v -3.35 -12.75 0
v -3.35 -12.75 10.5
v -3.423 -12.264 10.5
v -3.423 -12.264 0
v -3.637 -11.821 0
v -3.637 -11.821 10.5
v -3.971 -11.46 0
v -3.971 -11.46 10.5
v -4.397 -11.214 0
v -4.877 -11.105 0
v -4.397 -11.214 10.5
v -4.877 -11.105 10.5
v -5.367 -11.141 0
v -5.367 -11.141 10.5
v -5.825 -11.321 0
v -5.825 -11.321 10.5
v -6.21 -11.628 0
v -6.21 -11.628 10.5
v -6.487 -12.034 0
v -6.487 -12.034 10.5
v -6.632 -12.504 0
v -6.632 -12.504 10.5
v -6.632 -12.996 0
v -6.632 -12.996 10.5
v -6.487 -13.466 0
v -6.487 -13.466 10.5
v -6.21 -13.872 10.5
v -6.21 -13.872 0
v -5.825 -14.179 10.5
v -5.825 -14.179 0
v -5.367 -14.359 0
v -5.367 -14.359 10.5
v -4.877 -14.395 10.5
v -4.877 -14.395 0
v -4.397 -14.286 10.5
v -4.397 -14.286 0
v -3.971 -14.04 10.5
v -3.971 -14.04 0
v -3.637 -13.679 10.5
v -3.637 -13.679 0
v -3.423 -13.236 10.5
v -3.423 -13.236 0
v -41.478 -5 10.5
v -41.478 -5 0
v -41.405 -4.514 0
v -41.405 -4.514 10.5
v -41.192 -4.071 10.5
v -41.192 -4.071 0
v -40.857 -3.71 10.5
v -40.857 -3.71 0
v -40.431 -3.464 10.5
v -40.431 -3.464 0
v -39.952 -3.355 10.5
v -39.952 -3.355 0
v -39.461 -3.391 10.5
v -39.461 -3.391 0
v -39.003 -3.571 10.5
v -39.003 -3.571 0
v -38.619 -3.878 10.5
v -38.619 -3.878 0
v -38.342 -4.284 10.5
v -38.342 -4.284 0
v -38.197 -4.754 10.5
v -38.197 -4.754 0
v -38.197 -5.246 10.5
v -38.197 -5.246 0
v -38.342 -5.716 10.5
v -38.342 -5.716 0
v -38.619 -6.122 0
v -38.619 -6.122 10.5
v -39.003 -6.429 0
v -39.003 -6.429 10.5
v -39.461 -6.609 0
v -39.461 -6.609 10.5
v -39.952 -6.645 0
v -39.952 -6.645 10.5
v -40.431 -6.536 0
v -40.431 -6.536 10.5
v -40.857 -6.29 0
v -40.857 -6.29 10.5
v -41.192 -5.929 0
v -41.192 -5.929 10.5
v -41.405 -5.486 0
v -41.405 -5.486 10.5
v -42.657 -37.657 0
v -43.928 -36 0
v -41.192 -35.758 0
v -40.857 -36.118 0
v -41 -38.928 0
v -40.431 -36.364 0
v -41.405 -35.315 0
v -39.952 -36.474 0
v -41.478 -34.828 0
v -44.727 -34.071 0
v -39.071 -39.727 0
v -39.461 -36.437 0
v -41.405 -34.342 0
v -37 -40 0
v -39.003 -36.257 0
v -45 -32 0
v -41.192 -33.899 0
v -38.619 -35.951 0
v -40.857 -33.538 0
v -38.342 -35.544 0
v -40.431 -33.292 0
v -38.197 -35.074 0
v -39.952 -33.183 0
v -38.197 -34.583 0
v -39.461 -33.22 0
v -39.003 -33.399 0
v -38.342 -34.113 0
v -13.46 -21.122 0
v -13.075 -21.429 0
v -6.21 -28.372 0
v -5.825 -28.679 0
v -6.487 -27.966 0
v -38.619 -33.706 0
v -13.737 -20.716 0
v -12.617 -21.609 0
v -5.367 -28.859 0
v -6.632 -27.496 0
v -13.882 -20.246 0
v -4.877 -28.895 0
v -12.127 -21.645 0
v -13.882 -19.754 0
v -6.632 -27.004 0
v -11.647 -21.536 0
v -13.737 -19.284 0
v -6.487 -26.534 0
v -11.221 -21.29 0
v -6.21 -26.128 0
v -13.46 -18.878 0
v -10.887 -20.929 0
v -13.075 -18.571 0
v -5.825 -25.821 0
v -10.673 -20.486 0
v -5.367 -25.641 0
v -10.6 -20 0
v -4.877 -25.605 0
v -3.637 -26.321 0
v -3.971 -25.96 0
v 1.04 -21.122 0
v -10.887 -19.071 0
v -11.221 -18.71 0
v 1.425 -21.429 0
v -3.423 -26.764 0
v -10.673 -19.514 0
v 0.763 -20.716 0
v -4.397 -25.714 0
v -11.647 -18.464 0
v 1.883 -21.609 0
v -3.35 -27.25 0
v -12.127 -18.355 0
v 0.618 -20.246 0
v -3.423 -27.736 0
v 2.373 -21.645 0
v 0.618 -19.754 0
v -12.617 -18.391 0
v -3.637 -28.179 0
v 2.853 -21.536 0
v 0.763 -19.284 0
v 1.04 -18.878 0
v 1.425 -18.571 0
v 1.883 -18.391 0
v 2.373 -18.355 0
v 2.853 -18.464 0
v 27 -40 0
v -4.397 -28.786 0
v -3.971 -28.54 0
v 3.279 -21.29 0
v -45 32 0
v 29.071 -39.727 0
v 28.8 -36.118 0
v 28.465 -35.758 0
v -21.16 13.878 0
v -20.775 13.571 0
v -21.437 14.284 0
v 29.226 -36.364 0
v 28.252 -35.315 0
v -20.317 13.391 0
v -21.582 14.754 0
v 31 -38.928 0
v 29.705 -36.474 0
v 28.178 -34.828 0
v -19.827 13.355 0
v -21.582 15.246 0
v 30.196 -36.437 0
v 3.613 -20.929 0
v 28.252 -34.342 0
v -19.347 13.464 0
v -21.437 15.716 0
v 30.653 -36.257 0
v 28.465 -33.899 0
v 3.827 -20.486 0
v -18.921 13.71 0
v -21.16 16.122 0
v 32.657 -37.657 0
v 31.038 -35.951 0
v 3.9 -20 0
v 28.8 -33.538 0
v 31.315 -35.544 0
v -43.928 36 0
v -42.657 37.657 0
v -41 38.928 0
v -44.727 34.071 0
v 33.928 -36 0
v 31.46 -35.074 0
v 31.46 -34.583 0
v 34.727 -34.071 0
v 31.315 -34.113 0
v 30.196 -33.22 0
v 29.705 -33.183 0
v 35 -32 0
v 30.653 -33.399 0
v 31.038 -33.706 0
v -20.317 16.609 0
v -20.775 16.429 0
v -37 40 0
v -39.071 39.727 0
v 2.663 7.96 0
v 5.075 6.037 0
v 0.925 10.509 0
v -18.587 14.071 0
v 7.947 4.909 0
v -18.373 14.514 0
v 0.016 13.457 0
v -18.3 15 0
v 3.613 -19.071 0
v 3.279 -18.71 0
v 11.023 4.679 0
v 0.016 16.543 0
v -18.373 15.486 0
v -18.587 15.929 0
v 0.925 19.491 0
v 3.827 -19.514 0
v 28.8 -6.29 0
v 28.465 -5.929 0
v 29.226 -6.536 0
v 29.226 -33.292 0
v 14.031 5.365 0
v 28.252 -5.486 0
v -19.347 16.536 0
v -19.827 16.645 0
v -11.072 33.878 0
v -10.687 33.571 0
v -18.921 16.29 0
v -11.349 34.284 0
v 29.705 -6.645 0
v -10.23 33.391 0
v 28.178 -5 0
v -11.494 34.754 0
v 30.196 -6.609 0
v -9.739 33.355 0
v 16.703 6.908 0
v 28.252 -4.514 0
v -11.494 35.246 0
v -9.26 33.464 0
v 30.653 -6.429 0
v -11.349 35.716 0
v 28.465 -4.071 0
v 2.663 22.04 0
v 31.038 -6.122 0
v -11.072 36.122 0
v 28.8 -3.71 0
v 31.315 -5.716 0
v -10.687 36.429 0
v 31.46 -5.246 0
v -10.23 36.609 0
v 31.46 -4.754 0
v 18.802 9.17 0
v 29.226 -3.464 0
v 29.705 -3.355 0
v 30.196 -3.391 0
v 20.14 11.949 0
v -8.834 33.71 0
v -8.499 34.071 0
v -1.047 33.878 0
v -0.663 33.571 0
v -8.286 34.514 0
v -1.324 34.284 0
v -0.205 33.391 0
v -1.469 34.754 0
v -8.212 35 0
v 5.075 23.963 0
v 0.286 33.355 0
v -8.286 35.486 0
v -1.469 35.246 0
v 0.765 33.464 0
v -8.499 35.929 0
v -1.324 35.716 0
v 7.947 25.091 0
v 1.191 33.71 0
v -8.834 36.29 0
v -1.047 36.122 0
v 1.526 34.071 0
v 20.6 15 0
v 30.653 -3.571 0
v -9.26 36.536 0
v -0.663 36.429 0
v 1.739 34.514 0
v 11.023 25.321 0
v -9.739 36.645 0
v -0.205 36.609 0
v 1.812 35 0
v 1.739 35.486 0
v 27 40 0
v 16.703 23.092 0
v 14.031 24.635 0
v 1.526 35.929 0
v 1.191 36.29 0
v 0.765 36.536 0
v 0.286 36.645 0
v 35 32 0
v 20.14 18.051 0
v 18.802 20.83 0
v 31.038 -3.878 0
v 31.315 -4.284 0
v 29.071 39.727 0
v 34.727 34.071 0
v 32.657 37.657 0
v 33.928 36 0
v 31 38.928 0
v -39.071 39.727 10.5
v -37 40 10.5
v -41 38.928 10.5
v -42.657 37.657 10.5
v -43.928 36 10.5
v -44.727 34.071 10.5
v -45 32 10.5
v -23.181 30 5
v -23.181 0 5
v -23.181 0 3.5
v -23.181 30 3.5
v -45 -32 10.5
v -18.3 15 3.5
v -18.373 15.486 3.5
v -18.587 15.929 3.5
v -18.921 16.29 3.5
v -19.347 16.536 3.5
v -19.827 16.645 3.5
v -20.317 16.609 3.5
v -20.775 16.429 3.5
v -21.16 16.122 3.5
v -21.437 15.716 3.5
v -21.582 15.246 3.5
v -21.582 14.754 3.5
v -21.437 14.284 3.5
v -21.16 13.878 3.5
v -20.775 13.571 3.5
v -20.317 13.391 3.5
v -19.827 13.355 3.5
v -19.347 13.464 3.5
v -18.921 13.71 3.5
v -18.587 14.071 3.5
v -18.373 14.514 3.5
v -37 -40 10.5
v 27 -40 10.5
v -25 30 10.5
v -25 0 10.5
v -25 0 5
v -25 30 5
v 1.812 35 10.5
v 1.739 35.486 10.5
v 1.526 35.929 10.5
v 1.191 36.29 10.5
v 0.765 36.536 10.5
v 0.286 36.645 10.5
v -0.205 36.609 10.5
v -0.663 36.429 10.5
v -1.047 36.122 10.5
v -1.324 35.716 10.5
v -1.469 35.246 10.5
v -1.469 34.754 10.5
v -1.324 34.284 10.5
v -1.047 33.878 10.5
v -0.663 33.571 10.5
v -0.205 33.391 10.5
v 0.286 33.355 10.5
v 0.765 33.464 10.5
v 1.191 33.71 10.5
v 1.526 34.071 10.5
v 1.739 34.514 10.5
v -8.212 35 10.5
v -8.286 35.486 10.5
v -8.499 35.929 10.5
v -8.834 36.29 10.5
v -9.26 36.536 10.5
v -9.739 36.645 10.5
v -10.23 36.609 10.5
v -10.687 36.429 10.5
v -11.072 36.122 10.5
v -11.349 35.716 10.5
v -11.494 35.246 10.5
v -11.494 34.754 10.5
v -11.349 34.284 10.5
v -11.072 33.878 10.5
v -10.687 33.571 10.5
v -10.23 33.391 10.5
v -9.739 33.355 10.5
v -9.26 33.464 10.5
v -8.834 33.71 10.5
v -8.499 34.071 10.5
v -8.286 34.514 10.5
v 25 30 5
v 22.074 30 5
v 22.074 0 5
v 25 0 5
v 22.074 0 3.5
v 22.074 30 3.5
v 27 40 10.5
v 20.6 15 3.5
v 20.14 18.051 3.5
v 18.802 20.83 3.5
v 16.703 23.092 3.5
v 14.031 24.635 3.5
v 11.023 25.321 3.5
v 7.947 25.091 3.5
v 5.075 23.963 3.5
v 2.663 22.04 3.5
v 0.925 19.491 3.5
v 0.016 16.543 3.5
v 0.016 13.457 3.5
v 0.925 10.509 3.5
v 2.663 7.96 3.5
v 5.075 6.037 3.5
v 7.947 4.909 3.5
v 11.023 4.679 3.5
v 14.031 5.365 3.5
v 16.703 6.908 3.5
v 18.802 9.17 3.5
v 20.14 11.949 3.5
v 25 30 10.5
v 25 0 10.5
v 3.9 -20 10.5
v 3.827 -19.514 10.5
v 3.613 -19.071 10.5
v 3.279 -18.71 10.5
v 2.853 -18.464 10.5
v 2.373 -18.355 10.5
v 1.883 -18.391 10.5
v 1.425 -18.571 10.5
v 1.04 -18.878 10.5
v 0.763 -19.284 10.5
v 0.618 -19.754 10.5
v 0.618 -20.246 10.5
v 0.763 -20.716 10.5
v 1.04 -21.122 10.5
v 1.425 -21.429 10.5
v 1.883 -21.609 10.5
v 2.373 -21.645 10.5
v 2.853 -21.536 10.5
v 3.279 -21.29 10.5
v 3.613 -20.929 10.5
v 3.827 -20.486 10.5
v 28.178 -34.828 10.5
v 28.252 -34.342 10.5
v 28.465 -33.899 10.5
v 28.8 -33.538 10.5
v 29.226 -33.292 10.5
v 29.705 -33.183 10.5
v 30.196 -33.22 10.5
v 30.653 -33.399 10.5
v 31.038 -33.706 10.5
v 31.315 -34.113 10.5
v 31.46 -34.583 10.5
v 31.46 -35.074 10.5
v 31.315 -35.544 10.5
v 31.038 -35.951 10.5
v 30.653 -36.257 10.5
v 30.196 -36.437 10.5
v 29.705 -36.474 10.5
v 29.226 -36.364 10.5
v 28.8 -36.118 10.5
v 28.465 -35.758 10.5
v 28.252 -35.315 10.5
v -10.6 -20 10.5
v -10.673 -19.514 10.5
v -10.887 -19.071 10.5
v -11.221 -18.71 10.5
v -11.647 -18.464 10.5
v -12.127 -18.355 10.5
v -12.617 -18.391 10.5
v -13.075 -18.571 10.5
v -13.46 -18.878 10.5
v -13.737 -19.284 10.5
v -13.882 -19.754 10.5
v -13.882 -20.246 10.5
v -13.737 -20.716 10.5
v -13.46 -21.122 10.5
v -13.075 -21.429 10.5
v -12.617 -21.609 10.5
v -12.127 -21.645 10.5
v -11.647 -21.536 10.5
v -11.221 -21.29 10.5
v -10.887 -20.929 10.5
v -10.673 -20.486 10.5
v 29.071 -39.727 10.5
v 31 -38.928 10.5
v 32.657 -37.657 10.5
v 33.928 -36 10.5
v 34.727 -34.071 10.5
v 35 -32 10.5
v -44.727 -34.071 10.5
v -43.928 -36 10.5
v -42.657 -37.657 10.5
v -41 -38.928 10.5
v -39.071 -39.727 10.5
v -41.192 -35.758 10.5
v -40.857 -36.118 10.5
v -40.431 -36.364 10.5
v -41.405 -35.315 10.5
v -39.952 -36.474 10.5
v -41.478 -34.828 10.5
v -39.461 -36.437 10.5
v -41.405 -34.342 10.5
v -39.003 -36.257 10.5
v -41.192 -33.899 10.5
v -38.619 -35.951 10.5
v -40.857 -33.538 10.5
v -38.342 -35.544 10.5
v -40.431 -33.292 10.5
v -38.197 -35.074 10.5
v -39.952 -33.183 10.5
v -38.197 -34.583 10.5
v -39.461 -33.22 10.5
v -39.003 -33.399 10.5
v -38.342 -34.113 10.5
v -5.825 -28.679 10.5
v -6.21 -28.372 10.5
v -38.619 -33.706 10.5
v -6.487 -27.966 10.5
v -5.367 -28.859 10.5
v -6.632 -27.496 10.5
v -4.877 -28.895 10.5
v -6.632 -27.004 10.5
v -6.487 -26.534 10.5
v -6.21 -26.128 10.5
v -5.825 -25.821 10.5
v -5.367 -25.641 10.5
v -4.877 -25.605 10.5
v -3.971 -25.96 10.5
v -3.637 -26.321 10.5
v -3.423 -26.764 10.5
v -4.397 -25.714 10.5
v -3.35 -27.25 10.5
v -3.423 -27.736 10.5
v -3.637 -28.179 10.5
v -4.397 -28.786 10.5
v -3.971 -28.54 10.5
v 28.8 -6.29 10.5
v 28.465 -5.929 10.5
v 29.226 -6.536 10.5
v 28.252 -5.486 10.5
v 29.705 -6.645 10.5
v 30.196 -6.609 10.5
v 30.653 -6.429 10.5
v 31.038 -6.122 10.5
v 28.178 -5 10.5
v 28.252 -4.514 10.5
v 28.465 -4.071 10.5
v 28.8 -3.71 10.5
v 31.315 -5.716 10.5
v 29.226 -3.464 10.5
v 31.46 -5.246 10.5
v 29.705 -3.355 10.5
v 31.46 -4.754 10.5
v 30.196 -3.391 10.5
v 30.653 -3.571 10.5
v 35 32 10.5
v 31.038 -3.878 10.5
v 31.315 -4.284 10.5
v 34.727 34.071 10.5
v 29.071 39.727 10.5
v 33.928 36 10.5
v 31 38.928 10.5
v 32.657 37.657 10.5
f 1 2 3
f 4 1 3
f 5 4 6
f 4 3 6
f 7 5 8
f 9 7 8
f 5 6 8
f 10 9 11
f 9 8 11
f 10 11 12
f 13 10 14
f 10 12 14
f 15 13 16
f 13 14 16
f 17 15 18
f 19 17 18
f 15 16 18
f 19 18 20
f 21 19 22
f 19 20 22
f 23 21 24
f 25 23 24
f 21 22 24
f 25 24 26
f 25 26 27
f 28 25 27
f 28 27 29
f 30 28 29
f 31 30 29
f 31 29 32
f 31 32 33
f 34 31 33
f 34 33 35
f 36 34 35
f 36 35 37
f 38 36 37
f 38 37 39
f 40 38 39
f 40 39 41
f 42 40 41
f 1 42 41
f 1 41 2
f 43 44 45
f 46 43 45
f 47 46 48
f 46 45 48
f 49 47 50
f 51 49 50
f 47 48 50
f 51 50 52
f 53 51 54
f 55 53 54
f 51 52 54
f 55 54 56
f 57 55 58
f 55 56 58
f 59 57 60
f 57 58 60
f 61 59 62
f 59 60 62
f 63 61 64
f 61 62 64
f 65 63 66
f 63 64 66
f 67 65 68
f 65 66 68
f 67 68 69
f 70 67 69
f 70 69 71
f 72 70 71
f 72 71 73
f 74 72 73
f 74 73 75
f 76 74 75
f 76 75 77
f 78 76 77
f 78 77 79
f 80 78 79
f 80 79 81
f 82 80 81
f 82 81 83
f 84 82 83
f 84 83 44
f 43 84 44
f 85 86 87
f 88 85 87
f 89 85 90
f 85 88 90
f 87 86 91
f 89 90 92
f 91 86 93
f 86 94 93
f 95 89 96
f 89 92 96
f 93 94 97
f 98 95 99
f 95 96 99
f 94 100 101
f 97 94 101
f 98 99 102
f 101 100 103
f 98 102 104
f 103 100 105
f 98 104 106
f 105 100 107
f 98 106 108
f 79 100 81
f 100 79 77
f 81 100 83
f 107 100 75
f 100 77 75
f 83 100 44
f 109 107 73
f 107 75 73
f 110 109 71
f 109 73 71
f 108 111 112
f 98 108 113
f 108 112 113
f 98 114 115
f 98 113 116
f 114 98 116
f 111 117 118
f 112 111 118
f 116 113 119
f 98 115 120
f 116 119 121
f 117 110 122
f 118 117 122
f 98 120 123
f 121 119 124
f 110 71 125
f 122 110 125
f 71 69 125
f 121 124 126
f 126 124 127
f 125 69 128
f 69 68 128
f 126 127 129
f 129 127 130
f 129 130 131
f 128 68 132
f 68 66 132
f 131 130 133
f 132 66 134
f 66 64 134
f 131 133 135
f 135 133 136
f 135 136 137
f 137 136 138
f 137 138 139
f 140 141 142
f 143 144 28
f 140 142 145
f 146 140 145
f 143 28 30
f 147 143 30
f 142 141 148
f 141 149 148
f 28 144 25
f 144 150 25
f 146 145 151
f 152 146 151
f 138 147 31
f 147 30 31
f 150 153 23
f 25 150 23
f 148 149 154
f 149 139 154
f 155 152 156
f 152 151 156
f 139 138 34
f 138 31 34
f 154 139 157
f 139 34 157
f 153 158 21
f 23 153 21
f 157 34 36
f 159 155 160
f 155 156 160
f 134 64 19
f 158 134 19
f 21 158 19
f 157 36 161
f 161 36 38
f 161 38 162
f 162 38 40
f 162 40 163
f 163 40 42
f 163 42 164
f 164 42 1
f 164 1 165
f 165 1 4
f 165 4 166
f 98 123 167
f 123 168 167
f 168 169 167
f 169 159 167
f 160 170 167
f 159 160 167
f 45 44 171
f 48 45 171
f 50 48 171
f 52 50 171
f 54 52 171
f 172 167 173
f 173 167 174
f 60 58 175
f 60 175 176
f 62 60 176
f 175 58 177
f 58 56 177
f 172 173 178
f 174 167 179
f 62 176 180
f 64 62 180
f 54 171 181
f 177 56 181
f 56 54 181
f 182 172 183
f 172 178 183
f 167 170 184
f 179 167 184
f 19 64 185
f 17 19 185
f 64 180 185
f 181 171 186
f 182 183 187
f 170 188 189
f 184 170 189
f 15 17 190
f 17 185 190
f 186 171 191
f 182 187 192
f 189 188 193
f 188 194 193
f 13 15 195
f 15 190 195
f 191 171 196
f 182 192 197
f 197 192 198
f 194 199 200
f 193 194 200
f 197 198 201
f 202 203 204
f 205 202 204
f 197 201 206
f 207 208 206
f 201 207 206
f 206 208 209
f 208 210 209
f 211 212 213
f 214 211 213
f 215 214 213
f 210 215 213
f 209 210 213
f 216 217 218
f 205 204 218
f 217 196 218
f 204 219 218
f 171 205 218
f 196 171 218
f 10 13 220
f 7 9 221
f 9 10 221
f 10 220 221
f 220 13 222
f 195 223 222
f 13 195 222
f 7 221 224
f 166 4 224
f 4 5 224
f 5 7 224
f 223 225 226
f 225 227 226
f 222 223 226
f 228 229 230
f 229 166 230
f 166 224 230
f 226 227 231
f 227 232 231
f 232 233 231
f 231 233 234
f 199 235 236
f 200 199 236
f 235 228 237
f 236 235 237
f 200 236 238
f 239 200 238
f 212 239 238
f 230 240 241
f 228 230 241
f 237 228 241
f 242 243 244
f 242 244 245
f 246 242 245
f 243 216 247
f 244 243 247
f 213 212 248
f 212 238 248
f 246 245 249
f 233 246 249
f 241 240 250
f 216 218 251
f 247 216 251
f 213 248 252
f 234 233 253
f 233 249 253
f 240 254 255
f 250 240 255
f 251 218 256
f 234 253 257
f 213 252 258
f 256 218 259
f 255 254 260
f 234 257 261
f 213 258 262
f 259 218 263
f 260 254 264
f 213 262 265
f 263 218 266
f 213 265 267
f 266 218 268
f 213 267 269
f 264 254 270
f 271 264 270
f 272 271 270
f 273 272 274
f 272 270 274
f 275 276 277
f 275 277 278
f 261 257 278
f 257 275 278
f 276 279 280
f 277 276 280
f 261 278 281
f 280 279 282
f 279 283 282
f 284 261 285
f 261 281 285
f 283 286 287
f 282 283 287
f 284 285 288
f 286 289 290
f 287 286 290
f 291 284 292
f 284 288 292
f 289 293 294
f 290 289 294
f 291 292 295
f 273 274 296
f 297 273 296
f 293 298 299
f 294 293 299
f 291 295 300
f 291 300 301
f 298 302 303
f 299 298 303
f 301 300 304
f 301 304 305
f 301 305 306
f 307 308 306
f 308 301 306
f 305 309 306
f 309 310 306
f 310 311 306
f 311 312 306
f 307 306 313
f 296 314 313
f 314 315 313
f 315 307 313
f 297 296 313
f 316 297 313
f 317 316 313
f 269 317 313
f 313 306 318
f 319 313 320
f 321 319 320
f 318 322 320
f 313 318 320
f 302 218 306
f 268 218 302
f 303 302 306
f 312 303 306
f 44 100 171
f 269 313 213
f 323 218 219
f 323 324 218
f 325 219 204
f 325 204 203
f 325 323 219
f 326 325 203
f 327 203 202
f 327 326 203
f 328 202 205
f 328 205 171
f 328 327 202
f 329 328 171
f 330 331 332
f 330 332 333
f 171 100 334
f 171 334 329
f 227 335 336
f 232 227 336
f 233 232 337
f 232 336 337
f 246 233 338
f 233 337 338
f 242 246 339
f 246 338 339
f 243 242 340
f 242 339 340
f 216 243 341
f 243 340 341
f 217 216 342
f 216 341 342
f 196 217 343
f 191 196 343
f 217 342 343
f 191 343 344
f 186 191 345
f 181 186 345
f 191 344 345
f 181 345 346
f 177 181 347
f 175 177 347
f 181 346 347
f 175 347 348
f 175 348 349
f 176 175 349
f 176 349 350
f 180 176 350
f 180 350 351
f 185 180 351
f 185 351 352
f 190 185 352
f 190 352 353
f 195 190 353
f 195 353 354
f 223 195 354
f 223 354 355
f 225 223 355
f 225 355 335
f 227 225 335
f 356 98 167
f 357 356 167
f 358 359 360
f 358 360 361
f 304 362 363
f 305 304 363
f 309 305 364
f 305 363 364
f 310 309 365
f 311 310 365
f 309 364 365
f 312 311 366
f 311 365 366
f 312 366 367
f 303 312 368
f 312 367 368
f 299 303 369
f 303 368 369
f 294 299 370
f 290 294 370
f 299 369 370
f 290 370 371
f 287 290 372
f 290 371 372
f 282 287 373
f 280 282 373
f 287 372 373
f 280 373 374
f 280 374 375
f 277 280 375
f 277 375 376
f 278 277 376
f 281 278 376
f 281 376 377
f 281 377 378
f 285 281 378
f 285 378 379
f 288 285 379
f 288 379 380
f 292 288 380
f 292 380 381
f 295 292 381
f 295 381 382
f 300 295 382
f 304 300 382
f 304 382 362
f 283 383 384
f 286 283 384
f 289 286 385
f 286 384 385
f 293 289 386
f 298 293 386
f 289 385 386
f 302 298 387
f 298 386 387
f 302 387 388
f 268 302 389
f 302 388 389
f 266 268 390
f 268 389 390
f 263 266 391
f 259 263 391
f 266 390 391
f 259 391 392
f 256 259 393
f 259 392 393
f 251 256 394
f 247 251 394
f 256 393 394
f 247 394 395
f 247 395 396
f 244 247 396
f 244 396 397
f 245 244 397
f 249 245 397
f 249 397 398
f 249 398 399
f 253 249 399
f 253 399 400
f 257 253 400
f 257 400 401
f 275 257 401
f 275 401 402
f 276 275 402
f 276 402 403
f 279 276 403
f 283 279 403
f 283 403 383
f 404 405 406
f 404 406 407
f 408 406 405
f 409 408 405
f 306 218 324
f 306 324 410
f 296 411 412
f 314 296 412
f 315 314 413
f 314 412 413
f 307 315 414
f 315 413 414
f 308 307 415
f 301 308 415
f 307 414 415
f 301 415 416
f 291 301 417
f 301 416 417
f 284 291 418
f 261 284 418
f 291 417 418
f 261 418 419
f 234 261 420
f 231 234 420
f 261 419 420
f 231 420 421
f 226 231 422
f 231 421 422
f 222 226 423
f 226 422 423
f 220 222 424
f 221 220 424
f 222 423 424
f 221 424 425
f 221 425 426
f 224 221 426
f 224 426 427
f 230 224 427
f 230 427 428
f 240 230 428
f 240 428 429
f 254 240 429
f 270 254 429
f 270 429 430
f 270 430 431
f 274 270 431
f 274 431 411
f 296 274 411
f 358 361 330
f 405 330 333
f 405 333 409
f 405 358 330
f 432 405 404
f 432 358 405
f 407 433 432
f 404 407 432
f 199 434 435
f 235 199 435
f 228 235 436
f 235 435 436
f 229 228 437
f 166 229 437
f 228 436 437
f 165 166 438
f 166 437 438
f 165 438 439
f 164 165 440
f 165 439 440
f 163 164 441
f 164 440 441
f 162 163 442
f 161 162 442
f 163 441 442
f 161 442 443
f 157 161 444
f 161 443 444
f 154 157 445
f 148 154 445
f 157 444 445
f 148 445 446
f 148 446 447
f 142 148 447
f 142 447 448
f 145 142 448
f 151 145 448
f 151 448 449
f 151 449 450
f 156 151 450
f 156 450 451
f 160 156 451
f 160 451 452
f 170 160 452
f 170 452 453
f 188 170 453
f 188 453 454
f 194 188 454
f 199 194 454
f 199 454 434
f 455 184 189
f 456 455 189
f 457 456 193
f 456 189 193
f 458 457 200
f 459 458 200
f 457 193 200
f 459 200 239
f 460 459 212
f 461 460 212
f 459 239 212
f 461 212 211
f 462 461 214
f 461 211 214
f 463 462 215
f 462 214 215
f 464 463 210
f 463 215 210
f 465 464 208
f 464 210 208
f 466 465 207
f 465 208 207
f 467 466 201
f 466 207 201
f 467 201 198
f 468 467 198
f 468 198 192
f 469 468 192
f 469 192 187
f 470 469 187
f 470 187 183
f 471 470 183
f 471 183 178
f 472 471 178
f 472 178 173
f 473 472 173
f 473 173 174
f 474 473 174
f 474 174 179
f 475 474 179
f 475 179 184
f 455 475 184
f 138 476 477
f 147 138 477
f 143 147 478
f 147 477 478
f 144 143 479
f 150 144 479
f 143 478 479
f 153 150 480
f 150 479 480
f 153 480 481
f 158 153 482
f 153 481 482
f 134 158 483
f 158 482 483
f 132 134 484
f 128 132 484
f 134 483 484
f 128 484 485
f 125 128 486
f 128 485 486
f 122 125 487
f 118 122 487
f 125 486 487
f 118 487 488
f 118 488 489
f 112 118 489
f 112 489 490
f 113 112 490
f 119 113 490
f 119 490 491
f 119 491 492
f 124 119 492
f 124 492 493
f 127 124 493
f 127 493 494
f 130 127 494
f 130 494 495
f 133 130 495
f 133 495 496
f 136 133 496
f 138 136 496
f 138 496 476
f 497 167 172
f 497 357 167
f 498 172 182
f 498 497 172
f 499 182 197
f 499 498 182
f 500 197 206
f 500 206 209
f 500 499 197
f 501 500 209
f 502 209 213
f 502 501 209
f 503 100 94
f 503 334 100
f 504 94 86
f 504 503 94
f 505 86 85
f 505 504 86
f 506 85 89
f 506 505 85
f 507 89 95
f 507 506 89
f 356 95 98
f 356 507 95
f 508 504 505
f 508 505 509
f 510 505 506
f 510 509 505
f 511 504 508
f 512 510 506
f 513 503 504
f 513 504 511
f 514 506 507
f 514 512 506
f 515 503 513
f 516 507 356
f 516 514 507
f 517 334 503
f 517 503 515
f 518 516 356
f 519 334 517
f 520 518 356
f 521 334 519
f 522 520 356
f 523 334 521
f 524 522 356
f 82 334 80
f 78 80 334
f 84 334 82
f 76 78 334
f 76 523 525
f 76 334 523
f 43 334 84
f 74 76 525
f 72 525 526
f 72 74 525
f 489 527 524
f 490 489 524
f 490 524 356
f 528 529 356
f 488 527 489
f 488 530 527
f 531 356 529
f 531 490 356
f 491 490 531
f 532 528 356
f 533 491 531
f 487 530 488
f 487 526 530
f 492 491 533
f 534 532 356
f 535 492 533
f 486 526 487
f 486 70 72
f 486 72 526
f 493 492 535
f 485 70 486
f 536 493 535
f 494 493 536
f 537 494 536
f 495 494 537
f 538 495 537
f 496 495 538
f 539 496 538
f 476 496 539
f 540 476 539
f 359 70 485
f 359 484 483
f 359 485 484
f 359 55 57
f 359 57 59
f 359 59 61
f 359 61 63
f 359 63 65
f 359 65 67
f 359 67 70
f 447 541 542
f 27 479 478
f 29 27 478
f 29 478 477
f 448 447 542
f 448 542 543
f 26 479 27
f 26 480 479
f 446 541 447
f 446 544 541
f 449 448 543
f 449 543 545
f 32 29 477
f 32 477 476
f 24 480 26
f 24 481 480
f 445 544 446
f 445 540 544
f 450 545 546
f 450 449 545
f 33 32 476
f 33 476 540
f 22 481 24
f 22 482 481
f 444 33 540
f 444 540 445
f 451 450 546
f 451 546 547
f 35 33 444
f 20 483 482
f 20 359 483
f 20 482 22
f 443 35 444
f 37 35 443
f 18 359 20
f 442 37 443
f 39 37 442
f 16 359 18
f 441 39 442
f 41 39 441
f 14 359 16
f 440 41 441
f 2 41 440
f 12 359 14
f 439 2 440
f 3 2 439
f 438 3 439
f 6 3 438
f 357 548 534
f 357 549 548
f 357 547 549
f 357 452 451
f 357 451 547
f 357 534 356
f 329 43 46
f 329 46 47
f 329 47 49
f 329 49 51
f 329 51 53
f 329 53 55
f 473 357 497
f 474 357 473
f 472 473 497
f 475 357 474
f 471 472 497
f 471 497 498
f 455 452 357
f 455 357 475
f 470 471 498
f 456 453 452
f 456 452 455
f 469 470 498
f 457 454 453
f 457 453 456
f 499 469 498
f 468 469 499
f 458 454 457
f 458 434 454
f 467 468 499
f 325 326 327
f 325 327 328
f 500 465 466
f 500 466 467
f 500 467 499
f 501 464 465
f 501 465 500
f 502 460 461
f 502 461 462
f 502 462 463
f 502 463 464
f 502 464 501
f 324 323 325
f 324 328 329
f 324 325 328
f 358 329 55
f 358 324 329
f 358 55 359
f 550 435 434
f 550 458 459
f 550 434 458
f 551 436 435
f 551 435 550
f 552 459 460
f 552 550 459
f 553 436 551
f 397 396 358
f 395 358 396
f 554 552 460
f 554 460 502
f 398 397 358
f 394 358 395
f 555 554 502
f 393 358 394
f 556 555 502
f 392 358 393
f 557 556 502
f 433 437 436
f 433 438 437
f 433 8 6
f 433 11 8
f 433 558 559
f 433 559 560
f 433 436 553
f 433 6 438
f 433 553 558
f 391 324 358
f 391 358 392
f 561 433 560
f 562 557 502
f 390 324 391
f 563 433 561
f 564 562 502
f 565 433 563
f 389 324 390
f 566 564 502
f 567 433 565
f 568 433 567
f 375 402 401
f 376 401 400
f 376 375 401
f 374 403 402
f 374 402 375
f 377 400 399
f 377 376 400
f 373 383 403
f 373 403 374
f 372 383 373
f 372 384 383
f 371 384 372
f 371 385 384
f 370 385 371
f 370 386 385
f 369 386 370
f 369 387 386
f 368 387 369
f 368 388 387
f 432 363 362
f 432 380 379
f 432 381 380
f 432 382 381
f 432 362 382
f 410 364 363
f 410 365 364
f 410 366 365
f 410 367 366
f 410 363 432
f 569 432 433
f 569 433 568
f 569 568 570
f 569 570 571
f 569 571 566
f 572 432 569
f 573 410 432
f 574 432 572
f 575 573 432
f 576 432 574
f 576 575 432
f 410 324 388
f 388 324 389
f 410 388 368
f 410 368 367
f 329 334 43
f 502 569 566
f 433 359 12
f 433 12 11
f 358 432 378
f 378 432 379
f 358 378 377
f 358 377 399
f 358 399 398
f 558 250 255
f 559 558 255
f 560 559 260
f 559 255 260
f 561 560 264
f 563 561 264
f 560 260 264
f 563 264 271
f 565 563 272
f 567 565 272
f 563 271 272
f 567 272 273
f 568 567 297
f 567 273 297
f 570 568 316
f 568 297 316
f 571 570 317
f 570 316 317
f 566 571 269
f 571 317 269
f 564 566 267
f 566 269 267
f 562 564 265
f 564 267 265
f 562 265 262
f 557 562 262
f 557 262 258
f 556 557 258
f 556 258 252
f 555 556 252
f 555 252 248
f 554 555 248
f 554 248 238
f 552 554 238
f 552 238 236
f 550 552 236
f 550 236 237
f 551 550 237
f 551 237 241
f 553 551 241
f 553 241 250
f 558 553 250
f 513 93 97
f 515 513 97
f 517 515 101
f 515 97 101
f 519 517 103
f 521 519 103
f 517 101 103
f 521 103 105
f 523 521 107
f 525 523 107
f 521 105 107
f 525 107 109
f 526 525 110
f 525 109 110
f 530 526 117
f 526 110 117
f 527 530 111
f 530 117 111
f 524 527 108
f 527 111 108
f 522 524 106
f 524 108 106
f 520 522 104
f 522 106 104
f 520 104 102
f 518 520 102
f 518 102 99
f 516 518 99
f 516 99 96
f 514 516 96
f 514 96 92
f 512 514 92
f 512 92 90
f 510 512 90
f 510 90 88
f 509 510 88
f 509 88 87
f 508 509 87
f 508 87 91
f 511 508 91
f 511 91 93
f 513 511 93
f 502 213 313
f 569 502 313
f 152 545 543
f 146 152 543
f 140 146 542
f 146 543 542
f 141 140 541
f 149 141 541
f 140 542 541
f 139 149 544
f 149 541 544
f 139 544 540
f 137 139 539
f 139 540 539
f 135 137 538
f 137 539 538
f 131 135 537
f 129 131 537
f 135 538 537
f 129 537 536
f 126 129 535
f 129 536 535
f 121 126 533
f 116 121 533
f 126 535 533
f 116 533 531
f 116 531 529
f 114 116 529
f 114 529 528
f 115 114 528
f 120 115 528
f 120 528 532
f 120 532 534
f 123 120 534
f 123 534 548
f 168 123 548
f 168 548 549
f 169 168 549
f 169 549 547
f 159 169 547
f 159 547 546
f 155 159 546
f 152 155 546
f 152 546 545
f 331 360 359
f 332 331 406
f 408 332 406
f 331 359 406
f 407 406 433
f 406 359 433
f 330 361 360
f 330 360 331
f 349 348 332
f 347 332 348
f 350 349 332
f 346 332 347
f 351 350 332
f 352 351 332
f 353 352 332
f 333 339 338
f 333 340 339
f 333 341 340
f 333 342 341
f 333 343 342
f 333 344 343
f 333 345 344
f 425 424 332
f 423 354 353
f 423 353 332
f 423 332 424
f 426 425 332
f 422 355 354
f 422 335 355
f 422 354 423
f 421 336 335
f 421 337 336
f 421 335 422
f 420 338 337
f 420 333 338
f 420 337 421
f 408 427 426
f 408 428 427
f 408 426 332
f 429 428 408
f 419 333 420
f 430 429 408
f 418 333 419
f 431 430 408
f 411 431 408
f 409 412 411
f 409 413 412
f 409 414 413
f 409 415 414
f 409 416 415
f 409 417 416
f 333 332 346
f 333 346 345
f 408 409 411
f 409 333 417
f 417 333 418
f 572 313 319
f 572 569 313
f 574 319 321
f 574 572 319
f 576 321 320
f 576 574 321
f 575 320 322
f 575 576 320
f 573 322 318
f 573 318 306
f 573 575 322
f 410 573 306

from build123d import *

# Parameters (mm, degrees)
SKETCH_1_W          = 80
SKETCH_1_H          = 80
EXTRUDE_1_DEPTH     = 10.5
SKETCH_3_R          = 10.35
SKETCH_3_R_2        = 1.65
CUT_EXTRUDE_1_DEPTH = 62.116691664
SKETCH_2_W          = 50
SKETCH_2_H          = 30
CUT_EXTRUDE_2_DEPTH = 5.5
SKETCH_6_W          = 45.255083204
SKETCH_6_H          = 30
CUT_EXTRUDE_3_DEPTH = 7
SKETCH_7_R          = 1.65
CUT_EXTRUDE_4_DEPTH = 62.116691664
FILLET_1_R          = 8
FILLET_2_R          = 8
FILLET_3_R          = 8
FILLET_4_R          = 8
SKETCH_9_R          = 1.65
CUT_EXTRUDE_5_DEPTH = 62.116691664


with BuildPart() as part:
    # 草图1 → 凸台-拉伸1 (new body)
    with BuildSketch(Plane.XY):
        with Locations((-5, 0)):
            Rectangle(SKETCH_1_W, SKETCH_1_H)
    extrude(amount=EXTRUDE_1_DEPTH)

    # 草图3 → 切除-拉伸1 (cut, through all)
    with BuildSketch(Plane.XY.offset(10.5)):
        with Locations((10.25, 15)):
            Circle(SKETCH_3_R)
        with Locations((-19.95, 15)):
            Circle(SKETCH_3_R_2)
        with Locations((-9.86238383, 35)):
            Circle(SKETCH_3_R_2)
        with Locations((0.16238383, 35)):
            Circle(SKETCH_3_R_2)
    extrude(amount=-CUT_EXTRUDE_1_DEPTH, mode=Mode.SUBTRACT)

    # 草图2 → 切除-拉伸2 (cut)
    with BuildSketch(Plane.XY.offset(10.5)):
        with Locations((0, 15)):
            Rectangle(SKETCH_2_W, SKETCH_2_H)
    extrude(amount=-CUT_EXTRUDE_2_DEPTH, mode=Mode.SUBTRACT)

    # 草图6 → 切除-拉伸3 (cut)
    with BuildSketch(Plane.XY.offset(10.5)):
        with Locations((-0.553390963, 15)):
            Rectangle(SKETCH_6_W, SKETCH_6_H)
    extrude(amount=-CUT_EXTRUDE_3_DEPTH, mode=Mode.SUBTRACT)

    # 草图7 → 切除-拉伸4 (cut, through all)
    with BuildSketch(Plane.XY.offset(10.5)):
        with Locations((-5, -12.75)):
            Circle(SKETCH_7_R)
        with Locations((2.25, -20)):
            Circle(SKETCH_7_R)
        with Locations((-5, -27.25)):
            Circle(SKETCH_7_R)
        with Locations((-12.25, -20)):
            Circle(SKETCH_7_R)
    extrude(amount=-CUT_EXTRUDE_4_DEPTH, mode=Mode.SUBTRACT)

    # 圆角1
    fillet_1_edges = [part.edges().sort_by_distance(p)[0] for p in [
        (-45, -40, 5.25),
    ]]
    fillet(fillet_1_edges, radius=FILLET_1_R)

    # 圆角2
    fillet_2_edges = [part.edges().sort_by_distance(p)[0] for p in [
        (35, -40, 5.25),
    ]]
    fillet(fillet_2_edges, radius=FILLET_2_R)

    # 圆角3
    fillet_3_edges = [part.edges().sort_by_distance(p)[0] for p in [
        (35, 40, 5.25),
    ]]
    fillet(fillet_3_edges, radius=FILLET_3_R)

    # 圆角4
    fillet_4_edges = [part.edges().sort_by_distance(p)[0] for p in [
        (-45, 40, 5.25),
    ]]
    fillet(fillet_4_edges, radius=FILLET_4_R)

    # 草图9 → 切除-拉伸5 (cut, through all)
    with BuildSketch(Plane(origin=(0, 0, 0), x_dir=(-1, 0, 0), z_dir=(0, 0, -1))):
        with Locations((-29.828427125, -34.828427125)):
            Circle(SKETCH_9_R)
        with Locations((39.828427125, -34.828427125)):
            Circle(SKETCH_9_R)
        with Locations((-29.828427125, -5)):
            Circle(SKETCH_9_R)
        with Locations((39.828427125, -5)):
            Circle(SKETCH_9_R)
    extrude(amount=-CUT_EXTRUDE_5_DEPTH, mode=Mode.SUBTRACT)


solid = part.part
